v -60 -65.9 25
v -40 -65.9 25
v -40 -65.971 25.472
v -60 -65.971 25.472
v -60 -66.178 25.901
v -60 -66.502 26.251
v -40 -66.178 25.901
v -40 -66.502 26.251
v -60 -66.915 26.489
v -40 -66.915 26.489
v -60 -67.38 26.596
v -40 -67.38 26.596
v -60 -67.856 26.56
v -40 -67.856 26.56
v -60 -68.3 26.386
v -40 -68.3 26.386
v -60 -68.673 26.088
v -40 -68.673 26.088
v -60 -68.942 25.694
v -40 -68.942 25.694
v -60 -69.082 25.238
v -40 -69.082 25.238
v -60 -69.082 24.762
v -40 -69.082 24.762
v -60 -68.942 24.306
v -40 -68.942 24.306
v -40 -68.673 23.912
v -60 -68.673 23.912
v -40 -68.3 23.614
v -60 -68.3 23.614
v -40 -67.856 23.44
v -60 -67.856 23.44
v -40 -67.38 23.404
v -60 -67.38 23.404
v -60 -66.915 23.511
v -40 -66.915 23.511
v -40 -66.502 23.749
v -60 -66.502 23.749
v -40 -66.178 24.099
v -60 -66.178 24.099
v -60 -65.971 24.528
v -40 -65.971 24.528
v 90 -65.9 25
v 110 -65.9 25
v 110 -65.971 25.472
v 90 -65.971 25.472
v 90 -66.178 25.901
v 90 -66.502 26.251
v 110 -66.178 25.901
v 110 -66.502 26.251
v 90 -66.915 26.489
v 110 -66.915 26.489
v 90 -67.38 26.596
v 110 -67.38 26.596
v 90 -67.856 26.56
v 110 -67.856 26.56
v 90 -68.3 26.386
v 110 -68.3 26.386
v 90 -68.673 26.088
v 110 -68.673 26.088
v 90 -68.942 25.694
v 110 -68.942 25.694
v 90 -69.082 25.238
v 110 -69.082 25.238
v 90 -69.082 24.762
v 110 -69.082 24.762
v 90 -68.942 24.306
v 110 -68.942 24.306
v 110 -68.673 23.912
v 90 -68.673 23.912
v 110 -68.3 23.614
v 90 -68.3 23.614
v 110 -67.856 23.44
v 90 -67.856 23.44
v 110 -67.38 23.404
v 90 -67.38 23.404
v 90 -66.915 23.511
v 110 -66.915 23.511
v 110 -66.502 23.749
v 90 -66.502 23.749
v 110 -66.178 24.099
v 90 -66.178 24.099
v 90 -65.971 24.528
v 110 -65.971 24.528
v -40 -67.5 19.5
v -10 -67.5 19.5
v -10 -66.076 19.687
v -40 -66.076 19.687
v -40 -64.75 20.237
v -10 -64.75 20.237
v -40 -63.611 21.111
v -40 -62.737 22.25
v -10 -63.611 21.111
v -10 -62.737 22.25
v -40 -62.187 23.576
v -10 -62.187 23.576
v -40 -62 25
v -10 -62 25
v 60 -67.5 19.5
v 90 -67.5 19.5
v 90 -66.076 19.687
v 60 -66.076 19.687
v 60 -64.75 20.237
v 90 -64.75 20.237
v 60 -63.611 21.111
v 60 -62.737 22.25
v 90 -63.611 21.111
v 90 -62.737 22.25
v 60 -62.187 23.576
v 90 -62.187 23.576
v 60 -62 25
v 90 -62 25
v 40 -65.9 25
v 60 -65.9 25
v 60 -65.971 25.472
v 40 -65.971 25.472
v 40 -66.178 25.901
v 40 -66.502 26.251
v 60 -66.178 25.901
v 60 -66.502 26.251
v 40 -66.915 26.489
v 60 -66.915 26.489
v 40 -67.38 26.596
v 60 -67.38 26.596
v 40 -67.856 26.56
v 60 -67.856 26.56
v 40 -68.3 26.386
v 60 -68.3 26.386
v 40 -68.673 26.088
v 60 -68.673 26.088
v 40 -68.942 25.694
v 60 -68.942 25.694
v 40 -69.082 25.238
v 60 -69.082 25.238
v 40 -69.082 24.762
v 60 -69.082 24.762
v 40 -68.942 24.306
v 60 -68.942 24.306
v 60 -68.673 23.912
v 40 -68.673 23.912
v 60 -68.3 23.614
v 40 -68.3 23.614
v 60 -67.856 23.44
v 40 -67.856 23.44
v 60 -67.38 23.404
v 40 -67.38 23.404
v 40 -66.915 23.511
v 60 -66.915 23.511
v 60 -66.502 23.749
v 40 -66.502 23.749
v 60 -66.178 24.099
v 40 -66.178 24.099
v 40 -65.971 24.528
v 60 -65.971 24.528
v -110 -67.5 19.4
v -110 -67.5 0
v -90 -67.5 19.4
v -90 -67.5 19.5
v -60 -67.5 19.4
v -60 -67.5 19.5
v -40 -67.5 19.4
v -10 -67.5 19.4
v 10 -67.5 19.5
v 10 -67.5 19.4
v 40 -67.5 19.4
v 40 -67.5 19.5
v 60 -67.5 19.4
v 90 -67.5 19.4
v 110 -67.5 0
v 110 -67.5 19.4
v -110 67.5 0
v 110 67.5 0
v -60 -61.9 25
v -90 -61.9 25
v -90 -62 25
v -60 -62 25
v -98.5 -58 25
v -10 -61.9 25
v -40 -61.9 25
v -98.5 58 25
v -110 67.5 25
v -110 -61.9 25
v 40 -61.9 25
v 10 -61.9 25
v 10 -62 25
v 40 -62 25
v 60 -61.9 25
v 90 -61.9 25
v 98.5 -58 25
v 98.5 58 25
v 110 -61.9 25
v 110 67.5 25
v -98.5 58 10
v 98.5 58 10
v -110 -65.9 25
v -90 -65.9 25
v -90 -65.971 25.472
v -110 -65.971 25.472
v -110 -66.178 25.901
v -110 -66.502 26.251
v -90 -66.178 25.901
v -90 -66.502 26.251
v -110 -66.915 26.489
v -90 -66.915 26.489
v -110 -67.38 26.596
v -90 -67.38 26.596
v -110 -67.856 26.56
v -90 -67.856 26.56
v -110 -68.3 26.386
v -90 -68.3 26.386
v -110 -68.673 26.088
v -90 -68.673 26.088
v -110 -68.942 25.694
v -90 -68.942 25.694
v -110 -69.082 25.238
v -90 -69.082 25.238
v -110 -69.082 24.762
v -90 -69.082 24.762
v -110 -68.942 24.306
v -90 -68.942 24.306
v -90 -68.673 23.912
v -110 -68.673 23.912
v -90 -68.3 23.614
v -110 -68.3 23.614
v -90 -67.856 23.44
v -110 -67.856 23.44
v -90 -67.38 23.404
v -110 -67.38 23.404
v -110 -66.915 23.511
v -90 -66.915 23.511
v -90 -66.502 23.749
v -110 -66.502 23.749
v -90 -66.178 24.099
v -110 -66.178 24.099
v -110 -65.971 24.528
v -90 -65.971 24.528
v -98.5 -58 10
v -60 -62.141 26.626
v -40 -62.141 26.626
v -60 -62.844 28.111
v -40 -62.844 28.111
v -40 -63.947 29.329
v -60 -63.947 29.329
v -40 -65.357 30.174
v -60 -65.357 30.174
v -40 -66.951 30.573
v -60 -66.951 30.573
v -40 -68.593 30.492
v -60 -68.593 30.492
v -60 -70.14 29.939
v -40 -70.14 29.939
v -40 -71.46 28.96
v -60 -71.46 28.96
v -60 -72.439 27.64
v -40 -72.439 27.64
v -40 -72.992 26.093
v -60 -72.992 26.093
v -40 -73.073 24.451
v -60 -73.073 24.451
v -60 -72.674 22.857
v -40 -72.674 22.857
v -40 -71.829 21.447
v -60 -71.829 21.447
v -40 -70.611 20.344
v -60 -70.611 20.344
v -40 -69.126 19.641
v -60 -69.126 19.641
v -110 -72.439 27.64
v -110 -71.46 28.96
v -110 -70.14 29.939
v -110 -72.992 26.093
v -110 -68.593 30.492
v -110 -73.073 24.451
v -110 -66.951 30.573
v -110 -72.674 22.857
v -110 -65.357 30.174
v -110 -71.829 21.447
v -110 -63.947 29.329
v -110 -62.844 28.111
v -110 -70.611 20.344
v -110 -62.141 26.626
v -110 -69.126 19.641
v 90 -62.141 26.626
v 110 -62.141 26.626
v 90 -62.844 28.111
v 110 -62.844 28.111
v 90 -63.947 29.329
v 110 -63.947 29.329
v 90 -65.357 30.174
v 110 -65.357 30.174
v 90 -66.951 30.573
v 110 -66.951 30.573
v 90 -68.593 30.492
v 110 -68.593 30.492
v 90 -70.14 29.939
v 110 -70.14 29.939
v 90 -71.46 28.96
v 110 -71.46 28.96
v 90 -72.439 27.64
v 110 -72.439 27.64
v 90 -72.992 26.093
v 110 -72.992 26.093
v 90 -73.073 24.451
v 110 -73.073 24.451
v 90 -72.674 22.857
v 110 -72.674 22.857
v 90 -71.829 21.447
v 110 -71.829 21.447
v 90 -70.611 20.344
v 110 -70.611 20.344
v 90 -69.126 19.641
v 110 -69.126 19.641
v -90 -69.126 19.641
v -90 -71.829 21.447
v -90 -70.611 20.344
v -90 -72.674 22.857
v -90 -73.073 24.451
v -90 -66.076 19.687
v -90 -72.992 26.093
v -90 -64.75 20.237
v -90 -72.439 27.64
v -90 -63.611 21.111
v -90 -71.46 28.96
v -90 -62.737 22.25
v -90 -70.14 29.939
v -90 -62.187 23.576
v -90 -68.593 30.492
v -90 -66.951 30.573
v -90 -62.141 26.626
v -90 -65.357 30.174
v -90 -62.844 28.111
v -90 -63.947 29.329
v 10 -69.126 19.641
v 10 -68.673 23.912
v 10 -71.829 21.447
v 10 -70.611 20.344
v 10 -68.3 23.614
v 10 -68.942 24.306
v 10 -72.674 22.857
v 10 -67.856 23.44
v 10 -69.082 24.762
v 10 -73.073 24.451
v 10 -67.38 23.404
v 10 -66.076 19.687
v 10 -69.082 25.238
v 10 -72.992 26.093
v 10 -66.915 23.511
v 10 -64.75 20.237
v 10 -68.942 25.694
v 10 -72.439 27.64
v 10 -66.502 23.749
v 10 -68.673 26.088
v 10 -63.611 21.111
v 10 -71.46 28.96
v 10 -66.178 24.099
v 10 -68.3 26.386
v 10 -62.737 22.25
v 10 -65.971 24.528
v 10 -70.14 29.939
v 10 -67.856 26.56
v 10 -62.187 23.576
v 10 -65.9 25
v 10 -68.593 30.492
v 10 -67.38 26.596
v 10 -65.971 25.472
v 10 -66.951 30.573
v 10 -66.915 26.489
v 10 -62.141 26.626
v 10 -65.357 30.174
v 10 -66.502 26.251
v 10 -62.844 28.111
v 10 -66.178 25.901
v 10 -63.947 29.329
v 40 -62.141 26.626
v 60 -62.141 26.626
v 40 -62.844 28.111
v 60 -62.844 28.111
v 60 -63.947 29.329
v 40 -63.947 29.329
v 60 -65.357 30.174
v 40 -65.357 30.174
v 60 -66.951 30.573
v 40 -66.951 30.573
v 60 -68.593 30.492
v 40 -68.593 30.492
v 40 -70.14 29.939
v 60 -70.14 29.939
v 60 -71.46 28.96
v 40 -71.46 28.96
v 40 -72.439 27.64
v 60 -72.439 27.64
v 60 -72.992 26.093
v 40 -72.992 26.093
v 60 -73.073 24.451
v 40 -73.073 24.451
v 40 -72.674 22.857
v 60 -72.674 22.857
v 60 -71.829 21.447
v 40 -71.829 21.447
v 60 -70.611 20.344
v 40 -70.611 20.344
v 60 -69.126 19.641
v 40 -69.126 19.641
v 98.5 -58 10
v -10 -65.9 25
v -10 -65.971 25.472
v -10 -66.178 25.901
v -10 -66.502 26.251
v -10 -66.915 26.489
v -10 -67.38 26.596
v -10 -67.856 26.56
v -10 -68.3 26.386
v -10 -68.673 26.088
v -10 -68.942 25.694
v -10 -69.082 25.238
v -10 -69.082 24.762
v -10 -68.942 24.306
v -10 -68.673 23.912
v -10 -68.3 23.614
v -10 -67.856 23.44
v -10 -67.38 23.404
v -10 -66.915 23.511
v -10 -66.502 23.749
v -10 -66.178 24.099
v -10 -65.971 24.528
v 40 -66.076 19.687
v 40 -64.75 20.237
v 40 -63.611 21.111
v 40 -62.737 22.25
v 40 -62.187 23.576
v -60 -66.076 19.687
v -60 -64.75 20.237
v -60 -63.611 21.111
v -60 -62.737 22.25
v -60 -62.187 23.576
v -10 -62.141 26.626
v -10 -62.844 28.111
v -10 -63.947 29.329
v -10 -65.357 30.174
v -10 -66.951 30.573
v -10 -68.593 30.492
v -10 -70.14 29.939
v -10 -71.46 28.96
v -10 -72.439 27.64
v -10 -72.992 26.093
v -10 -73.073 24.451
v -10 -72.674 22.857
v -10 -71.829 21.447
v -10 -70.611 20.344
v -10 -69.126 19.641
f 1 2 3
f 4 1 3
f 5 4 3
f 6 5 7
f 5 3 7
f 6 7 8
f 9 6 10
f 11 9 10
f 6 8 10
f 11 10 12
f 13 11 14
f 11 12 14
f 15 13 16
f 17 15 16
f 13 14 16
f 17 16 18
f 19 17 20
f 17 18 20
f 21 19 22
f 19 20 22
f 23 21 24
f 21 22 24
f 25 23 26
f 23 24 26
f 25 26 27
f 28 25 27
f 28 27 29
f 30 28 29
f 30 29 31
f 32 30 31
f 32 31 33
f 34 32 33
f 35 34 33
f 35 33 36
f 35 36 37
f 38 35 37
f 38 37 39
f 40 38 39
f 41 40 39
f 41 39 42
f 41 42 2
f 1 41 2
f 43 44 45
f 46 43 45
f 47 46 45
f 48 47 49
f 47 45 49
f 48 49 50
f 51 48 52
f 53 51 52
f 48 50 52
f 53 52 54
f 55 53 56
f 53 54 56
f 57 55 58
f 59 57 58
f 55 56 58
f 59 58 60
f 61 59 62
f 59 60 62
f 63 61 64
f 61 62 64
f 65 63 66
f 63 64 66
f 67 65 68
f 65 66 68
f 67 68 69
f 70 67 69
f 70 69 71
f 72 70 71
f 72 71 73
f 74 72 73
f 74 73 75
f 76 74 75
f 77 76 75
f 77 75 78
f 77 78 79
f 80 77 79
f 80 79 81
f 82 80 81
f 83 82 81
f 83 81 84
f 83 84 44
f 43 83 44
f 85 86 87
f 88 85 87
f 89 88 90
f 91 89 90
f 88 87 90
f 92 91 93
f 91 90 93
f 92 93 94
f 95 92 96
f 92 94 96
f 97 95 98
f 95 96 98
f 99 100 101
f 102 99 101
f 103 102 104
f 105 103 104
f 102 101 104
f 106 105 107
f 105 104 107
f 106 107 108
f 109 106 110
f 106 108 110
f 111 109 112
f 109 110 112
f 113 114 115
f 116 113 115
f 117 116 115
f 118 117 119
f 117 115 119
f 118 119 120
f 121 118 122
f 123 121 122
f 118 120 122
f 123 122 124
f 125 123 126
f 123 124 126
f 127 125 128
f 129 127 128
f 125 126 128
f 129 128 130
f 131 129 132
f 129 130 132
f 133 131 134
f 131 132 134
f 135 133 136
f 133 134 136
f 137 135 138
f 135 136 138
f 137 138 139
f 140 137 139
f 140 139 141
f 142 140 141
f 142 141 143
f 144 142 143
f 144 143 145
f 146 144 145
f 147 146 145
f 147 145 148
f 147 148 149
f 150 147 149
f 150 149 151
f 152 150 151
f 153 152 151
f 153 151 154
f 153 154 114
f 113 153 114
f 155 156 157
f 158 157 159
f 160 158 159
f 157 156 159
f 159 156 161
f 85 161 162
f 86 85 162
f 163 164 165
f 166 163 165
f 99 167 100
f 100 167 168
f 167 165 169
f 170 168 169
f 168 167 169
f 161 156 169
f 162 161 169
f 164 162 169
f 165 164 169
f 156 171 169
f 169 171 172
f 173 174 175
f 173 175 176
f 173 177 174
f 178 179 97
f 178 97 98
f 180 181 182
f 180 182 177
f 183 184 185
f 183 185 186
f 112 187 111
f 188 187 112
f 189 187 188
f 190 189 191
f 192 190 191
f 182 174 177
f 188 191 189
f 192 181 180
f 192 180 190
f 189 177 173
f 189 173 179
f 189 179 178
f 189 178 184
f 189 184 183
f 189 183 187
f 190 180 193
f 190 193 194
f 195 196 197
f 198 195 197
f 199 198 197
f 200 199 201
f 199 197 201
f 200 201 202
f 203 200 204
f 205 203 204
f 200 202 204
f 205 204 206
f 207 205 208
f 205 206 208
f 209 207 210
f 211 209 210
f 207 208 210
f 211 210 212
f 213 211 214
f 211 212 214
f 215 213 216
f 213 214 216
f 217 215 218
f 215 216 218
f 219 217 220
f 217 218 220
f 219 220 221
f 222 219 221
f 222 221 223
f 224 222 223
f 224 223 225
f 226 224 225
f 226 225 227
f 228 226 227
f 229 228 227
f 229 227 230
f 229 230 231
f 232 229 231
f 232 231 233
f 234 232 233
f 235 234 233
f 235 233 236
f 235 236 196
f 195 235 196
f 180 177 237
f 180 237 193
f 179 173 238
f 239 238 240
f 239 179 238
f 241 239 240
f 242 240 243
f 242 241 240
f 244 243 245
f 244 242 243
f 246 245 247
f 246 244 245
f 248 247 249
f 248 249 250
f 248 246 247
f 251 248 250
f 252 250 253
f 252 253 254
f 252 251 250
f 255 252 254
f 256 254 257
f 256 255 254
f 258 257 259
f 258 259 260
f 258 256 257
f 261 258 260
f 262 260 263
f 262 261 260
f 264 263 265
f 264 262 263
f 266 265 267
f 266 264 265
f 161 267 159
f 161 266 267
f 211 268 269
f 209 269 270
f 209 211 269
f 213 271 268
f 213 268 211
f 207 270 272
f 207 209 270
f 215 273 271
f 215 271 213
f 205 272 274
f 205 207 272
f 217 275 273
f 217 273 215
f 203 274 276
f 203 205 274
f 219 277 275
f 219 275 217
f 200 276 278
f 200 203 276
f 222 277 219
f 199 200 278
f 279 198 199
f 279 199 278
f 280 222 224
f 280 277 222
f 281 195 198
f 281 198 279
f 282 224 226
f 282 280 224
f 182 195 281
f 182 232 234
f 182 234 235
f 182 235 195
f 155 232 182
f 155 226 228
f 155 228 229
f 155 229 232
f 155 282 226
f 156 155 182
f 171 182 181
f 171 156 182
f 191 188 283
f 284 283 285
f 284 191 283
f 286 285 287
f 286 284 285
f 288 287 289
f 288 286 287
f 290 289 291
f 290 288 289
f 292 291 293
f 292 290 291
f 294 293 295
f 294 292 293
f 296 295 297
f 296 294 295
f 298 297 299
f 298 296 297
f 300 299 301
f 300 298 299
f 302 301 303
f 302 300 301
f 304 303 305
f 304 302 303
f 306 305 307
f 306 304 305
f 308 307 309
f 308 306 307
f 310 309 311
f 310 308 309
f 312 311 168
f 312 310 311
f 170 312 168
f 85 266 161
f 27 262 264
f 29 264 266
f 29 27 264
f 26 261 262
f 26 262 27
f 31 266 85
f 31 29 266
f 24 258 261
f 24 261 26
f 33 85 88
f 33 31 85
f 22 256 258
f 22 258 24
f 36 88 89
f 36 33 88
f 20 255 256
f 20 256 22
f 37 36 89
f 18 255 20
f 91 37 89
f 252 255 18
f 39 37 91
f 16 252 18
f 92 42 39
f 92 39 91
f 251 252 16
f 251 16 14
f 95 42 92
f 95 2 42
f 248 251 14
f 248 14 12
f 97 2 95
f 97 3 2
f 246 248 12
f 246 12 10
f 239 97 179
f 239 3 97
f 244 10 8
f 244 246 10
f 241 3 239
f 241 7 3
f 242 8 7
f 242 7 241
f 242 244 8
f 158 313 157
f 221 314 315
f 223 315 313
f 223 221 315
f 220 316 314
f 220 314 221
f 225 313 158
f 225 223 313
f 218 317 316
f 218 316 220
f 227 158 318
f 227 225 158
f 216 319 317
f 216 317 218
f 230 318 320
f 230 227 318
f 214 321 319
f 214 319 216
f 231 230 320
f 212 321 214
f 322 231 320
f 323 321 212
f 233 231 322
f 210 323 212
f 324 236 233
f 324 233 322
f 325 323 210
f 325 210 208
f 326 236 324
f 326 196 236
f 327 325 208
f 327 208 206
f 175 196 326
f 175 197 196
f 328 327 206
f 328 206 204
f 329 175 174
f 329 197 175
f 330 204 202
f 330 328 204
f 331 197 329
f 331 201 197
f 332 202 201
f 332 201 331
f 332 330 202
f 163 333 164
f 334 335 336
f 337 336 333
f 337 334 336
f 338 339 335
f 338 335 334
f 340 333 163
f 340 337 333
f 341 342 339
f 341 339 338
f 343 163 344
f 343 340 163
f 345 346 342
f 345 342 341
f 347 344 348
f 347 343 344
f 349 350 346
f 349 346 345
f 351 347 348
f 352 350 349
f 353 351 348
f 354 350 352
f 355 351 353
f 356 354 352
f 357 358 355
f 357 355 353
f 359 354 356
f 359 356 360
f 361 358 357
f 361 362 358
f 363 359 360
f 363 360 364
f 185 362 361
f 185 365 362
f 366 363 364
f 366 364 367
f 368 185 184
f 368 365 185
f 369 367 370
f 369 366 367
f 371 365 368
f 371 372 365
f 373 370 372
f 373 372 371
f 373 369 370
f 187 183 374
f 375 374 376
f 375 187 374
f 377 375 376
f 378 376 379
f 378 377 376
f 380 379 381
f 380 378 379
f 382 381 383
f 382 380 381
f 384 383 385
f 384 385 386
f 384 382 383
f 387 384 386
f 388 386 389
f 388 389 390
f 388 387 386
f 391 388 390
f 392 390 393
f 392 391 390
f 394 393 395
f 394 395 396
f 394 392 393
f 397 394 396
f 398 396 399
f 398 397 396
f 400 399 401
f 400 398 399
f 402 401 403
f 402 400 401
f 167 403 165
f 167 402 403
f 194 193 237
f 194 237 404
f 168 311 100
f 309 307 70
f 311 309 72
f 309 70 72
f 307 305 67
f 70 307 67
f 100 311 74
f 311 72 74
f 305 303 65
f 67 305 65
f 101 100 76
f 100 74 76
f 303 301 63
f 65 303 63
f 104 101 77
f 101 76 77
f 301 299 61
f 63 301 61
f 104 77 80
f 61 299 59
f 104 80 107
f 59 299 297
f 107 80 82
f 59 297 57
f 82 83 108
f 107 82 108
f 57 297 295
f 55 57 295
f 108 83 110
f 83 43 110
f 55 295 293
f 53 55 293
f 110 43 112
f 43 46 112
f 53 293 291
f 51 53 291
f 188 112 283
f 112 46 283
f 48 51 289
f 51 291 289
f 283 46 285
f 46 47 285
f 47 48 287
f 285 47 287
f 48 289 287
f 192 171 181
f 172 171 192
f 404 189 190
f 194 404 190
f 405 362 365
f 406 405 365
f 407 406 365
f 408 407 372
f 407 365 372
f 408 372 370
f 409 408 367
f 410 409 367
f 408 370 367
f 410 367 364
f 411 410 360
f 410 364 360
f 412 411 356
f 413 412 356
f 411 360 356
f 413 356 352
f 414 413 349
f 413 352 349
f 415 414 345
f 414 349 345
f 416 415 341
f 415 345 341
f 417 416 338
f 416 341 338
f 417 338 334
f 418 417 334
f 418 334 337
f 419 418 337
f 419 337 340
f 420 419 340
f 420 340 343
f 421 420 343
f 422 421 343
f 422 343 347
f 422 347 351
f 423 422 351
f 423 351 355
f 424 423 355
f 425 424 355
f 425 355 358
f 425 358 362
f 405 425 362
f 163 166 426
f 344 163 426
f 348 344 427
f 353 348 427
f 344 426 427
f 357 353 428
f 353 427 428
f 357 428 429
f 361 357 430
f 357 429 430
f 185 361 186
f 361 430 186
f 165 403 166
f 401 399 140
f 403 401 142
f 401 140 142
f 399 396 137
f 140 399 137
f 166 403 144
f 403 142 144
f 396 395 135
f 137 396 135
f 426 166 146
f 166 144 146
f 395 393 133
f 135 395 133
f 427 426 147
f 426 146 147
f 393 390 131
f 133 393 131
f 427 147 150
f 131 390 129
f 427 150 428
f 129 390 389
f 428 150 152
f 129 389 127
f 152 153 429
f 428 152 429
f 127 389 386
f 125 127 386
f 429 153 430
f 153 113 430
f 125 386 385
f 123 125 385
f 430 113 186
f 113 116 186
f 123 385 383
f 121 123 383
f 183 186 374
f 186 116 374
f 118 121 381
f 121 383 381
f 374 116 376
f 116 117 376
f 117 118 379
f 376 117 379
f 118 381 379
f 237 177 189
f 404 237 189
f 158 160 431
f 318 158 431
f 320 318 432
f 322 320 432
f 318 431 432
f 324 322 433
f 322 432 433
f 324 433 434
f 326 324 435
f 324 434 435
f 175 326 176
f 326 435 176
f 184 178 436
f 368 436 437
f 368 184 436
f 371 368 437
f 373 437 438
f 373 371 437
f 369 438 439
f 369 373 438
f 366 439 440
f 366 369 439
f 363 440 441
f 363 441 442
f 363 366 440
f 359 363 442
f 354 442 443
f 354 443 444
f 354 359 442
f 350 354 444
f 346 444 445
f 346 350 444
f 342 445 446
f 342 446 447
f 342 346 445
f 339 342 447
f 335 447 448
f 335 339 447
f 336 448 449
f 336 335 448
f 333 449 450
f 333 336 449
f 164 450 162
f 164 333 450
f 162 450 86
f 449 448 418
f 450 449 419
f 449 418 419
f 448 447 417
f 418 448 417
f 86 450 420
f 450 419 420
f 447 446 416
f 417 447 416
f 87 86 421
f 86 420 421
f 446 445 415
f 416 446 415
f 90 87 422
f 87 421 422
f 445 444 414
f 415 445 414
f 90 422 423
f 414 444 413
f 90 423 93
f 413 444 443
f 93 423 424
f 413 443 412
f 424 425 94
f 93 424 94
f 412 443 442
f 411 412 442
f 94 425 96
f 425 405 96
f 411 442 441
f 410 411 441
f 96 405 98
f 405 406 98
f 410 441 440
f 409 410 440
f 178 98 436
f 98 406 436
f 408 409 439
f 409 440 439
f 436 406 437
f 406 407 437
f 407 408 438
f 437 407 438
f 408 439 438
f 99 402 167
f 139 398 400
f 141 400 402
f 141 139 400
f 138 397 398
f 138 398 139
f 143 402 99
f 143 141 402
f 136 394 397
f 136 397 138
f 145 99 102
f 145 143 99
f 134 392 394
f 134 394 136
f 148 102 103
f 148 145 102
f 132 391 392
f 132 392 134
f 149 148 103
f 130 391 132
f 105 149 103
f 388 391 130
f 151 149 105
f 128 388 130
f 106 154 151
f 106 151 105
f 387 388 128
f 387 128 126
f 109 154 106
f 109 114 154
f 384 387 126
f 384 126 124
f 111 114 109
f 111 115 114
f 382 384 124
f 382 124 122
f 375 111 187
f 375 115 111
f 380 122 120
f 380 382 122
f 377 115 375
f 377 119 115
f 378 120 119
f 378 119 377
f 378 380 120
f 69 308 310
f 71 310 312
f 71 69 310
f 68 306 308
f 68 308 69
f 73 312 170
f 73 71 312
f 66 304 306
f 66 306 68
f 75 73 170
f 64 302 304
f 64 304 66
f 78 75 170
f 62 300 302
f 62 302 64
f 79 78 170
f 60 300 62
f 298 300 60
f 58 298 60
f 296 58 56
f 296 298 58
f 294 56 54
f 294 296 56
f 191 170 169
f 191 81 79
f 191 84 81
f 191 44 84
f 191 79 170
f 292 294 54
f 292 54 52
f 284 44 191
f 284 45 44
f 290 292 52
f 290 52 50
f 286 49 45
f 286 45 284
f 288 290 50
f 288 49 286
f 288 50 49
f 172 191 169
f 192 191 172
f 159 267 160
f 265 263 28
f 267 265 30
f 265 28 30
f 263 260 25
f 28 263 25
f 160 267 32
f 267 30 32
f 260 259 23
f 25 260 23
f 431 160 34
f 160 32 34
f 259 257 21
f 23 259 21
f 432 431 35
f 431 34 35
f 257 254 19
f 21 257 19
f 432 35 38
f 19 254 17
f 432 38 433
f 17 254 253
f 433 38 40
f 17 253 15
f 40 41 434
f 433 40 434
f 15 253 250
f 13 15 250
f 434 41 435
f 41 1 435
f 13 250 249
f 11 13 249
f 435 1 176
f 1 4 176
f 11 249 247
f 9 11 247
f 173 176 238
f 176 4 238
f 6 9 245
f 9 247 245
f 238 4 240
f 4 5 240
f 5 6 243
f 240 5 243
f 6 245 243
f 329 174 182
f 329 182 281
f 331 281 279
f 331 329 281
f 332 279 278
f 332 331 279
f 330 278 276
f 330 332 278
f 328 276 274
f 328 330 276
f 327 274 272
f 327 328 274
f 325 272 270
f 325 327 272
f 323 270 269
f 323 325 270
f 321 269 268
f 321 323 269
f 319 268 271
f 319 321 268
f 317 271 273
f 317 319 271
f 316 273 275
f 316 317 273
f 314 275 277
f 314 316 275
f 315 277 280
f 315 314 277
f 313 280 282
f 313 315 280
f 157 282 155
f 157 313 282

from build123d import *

# Parameters (mm, degrees)
SKETCH_W            = 220
SKETCH_H            = 135
PAD_DEPTH           = 25
SKETCH001_W         = 197
SKETCH001_H         = 116
POCKET_DEPTH        = 15
SKETCH002_R         = 5.5
POCKET001_DEPTH     = 220.001
SKETCH004_R         = 5.6
PAD001_DEPTH        = 20
LINEARPATTERN_COUNT = 5
LINEARPATTERN_PITCH = 50
SKETCH005_R         = 1.6
POCKET002_DEPTH     = 220.001


with BuildPart() as part:
    # Sketch → Pad (new body)
    with BuildSketch(Plane.XY):
        Rectangle(SKETCH_W, SKETCH_H)
    extrude(amount=PAD_DEPTH)

    # Sketch001 (on Face6 of Pad) → Pocket (cut)
    with BuildSketch(Plane.XY.offset(25)):
        Rectangle(SKETCH001_W, SKETCH001_H)
    extrude(amount=-POCKET_DEPTH, mode=Mode.SUBTRACT)

    # Sketch002 (on Face3 of Pocket) → Pocket001 (cut, through all)
    with BuildSketch(Plane.YZ.offset(110)):
        with Locations((-67.5, 25)):
            Circle(SKETCH002_R)
    extrude(amount=-POCKET001_DEPTH, mode=Mode.SUBTRACT)

    # Sketch004 (on Face3 of Pocket001) → Pad001 (join)
    with BuildSketch(Plane.YZ.offset(110)):
        with Locations((-67.5, 25)):
            Circle(SKETCH004_R)
    pad001 = extrude(amount=-PAD001_DEPTH)

    # LinearPattern: Pad001 ×5
    with Locations(*[(-i * LINEARPATTERN_PITCH, 0, 0) for i in range(1, LINEARPATTERN_COUNT)]):
        add(pad001)

    # Sketch005 (on Face31 of LinearPattern) → Pocket002 (cut, through all)
    with BuildSketch(Plane.YZ.offset(110)):
        with Locations((-67.5, 25)):
            Circle(SKETCH005_R)
    extrude(amount=-POCKET002_DEPTH, mode=Mode.SUBTRACT)


solid = part.part
